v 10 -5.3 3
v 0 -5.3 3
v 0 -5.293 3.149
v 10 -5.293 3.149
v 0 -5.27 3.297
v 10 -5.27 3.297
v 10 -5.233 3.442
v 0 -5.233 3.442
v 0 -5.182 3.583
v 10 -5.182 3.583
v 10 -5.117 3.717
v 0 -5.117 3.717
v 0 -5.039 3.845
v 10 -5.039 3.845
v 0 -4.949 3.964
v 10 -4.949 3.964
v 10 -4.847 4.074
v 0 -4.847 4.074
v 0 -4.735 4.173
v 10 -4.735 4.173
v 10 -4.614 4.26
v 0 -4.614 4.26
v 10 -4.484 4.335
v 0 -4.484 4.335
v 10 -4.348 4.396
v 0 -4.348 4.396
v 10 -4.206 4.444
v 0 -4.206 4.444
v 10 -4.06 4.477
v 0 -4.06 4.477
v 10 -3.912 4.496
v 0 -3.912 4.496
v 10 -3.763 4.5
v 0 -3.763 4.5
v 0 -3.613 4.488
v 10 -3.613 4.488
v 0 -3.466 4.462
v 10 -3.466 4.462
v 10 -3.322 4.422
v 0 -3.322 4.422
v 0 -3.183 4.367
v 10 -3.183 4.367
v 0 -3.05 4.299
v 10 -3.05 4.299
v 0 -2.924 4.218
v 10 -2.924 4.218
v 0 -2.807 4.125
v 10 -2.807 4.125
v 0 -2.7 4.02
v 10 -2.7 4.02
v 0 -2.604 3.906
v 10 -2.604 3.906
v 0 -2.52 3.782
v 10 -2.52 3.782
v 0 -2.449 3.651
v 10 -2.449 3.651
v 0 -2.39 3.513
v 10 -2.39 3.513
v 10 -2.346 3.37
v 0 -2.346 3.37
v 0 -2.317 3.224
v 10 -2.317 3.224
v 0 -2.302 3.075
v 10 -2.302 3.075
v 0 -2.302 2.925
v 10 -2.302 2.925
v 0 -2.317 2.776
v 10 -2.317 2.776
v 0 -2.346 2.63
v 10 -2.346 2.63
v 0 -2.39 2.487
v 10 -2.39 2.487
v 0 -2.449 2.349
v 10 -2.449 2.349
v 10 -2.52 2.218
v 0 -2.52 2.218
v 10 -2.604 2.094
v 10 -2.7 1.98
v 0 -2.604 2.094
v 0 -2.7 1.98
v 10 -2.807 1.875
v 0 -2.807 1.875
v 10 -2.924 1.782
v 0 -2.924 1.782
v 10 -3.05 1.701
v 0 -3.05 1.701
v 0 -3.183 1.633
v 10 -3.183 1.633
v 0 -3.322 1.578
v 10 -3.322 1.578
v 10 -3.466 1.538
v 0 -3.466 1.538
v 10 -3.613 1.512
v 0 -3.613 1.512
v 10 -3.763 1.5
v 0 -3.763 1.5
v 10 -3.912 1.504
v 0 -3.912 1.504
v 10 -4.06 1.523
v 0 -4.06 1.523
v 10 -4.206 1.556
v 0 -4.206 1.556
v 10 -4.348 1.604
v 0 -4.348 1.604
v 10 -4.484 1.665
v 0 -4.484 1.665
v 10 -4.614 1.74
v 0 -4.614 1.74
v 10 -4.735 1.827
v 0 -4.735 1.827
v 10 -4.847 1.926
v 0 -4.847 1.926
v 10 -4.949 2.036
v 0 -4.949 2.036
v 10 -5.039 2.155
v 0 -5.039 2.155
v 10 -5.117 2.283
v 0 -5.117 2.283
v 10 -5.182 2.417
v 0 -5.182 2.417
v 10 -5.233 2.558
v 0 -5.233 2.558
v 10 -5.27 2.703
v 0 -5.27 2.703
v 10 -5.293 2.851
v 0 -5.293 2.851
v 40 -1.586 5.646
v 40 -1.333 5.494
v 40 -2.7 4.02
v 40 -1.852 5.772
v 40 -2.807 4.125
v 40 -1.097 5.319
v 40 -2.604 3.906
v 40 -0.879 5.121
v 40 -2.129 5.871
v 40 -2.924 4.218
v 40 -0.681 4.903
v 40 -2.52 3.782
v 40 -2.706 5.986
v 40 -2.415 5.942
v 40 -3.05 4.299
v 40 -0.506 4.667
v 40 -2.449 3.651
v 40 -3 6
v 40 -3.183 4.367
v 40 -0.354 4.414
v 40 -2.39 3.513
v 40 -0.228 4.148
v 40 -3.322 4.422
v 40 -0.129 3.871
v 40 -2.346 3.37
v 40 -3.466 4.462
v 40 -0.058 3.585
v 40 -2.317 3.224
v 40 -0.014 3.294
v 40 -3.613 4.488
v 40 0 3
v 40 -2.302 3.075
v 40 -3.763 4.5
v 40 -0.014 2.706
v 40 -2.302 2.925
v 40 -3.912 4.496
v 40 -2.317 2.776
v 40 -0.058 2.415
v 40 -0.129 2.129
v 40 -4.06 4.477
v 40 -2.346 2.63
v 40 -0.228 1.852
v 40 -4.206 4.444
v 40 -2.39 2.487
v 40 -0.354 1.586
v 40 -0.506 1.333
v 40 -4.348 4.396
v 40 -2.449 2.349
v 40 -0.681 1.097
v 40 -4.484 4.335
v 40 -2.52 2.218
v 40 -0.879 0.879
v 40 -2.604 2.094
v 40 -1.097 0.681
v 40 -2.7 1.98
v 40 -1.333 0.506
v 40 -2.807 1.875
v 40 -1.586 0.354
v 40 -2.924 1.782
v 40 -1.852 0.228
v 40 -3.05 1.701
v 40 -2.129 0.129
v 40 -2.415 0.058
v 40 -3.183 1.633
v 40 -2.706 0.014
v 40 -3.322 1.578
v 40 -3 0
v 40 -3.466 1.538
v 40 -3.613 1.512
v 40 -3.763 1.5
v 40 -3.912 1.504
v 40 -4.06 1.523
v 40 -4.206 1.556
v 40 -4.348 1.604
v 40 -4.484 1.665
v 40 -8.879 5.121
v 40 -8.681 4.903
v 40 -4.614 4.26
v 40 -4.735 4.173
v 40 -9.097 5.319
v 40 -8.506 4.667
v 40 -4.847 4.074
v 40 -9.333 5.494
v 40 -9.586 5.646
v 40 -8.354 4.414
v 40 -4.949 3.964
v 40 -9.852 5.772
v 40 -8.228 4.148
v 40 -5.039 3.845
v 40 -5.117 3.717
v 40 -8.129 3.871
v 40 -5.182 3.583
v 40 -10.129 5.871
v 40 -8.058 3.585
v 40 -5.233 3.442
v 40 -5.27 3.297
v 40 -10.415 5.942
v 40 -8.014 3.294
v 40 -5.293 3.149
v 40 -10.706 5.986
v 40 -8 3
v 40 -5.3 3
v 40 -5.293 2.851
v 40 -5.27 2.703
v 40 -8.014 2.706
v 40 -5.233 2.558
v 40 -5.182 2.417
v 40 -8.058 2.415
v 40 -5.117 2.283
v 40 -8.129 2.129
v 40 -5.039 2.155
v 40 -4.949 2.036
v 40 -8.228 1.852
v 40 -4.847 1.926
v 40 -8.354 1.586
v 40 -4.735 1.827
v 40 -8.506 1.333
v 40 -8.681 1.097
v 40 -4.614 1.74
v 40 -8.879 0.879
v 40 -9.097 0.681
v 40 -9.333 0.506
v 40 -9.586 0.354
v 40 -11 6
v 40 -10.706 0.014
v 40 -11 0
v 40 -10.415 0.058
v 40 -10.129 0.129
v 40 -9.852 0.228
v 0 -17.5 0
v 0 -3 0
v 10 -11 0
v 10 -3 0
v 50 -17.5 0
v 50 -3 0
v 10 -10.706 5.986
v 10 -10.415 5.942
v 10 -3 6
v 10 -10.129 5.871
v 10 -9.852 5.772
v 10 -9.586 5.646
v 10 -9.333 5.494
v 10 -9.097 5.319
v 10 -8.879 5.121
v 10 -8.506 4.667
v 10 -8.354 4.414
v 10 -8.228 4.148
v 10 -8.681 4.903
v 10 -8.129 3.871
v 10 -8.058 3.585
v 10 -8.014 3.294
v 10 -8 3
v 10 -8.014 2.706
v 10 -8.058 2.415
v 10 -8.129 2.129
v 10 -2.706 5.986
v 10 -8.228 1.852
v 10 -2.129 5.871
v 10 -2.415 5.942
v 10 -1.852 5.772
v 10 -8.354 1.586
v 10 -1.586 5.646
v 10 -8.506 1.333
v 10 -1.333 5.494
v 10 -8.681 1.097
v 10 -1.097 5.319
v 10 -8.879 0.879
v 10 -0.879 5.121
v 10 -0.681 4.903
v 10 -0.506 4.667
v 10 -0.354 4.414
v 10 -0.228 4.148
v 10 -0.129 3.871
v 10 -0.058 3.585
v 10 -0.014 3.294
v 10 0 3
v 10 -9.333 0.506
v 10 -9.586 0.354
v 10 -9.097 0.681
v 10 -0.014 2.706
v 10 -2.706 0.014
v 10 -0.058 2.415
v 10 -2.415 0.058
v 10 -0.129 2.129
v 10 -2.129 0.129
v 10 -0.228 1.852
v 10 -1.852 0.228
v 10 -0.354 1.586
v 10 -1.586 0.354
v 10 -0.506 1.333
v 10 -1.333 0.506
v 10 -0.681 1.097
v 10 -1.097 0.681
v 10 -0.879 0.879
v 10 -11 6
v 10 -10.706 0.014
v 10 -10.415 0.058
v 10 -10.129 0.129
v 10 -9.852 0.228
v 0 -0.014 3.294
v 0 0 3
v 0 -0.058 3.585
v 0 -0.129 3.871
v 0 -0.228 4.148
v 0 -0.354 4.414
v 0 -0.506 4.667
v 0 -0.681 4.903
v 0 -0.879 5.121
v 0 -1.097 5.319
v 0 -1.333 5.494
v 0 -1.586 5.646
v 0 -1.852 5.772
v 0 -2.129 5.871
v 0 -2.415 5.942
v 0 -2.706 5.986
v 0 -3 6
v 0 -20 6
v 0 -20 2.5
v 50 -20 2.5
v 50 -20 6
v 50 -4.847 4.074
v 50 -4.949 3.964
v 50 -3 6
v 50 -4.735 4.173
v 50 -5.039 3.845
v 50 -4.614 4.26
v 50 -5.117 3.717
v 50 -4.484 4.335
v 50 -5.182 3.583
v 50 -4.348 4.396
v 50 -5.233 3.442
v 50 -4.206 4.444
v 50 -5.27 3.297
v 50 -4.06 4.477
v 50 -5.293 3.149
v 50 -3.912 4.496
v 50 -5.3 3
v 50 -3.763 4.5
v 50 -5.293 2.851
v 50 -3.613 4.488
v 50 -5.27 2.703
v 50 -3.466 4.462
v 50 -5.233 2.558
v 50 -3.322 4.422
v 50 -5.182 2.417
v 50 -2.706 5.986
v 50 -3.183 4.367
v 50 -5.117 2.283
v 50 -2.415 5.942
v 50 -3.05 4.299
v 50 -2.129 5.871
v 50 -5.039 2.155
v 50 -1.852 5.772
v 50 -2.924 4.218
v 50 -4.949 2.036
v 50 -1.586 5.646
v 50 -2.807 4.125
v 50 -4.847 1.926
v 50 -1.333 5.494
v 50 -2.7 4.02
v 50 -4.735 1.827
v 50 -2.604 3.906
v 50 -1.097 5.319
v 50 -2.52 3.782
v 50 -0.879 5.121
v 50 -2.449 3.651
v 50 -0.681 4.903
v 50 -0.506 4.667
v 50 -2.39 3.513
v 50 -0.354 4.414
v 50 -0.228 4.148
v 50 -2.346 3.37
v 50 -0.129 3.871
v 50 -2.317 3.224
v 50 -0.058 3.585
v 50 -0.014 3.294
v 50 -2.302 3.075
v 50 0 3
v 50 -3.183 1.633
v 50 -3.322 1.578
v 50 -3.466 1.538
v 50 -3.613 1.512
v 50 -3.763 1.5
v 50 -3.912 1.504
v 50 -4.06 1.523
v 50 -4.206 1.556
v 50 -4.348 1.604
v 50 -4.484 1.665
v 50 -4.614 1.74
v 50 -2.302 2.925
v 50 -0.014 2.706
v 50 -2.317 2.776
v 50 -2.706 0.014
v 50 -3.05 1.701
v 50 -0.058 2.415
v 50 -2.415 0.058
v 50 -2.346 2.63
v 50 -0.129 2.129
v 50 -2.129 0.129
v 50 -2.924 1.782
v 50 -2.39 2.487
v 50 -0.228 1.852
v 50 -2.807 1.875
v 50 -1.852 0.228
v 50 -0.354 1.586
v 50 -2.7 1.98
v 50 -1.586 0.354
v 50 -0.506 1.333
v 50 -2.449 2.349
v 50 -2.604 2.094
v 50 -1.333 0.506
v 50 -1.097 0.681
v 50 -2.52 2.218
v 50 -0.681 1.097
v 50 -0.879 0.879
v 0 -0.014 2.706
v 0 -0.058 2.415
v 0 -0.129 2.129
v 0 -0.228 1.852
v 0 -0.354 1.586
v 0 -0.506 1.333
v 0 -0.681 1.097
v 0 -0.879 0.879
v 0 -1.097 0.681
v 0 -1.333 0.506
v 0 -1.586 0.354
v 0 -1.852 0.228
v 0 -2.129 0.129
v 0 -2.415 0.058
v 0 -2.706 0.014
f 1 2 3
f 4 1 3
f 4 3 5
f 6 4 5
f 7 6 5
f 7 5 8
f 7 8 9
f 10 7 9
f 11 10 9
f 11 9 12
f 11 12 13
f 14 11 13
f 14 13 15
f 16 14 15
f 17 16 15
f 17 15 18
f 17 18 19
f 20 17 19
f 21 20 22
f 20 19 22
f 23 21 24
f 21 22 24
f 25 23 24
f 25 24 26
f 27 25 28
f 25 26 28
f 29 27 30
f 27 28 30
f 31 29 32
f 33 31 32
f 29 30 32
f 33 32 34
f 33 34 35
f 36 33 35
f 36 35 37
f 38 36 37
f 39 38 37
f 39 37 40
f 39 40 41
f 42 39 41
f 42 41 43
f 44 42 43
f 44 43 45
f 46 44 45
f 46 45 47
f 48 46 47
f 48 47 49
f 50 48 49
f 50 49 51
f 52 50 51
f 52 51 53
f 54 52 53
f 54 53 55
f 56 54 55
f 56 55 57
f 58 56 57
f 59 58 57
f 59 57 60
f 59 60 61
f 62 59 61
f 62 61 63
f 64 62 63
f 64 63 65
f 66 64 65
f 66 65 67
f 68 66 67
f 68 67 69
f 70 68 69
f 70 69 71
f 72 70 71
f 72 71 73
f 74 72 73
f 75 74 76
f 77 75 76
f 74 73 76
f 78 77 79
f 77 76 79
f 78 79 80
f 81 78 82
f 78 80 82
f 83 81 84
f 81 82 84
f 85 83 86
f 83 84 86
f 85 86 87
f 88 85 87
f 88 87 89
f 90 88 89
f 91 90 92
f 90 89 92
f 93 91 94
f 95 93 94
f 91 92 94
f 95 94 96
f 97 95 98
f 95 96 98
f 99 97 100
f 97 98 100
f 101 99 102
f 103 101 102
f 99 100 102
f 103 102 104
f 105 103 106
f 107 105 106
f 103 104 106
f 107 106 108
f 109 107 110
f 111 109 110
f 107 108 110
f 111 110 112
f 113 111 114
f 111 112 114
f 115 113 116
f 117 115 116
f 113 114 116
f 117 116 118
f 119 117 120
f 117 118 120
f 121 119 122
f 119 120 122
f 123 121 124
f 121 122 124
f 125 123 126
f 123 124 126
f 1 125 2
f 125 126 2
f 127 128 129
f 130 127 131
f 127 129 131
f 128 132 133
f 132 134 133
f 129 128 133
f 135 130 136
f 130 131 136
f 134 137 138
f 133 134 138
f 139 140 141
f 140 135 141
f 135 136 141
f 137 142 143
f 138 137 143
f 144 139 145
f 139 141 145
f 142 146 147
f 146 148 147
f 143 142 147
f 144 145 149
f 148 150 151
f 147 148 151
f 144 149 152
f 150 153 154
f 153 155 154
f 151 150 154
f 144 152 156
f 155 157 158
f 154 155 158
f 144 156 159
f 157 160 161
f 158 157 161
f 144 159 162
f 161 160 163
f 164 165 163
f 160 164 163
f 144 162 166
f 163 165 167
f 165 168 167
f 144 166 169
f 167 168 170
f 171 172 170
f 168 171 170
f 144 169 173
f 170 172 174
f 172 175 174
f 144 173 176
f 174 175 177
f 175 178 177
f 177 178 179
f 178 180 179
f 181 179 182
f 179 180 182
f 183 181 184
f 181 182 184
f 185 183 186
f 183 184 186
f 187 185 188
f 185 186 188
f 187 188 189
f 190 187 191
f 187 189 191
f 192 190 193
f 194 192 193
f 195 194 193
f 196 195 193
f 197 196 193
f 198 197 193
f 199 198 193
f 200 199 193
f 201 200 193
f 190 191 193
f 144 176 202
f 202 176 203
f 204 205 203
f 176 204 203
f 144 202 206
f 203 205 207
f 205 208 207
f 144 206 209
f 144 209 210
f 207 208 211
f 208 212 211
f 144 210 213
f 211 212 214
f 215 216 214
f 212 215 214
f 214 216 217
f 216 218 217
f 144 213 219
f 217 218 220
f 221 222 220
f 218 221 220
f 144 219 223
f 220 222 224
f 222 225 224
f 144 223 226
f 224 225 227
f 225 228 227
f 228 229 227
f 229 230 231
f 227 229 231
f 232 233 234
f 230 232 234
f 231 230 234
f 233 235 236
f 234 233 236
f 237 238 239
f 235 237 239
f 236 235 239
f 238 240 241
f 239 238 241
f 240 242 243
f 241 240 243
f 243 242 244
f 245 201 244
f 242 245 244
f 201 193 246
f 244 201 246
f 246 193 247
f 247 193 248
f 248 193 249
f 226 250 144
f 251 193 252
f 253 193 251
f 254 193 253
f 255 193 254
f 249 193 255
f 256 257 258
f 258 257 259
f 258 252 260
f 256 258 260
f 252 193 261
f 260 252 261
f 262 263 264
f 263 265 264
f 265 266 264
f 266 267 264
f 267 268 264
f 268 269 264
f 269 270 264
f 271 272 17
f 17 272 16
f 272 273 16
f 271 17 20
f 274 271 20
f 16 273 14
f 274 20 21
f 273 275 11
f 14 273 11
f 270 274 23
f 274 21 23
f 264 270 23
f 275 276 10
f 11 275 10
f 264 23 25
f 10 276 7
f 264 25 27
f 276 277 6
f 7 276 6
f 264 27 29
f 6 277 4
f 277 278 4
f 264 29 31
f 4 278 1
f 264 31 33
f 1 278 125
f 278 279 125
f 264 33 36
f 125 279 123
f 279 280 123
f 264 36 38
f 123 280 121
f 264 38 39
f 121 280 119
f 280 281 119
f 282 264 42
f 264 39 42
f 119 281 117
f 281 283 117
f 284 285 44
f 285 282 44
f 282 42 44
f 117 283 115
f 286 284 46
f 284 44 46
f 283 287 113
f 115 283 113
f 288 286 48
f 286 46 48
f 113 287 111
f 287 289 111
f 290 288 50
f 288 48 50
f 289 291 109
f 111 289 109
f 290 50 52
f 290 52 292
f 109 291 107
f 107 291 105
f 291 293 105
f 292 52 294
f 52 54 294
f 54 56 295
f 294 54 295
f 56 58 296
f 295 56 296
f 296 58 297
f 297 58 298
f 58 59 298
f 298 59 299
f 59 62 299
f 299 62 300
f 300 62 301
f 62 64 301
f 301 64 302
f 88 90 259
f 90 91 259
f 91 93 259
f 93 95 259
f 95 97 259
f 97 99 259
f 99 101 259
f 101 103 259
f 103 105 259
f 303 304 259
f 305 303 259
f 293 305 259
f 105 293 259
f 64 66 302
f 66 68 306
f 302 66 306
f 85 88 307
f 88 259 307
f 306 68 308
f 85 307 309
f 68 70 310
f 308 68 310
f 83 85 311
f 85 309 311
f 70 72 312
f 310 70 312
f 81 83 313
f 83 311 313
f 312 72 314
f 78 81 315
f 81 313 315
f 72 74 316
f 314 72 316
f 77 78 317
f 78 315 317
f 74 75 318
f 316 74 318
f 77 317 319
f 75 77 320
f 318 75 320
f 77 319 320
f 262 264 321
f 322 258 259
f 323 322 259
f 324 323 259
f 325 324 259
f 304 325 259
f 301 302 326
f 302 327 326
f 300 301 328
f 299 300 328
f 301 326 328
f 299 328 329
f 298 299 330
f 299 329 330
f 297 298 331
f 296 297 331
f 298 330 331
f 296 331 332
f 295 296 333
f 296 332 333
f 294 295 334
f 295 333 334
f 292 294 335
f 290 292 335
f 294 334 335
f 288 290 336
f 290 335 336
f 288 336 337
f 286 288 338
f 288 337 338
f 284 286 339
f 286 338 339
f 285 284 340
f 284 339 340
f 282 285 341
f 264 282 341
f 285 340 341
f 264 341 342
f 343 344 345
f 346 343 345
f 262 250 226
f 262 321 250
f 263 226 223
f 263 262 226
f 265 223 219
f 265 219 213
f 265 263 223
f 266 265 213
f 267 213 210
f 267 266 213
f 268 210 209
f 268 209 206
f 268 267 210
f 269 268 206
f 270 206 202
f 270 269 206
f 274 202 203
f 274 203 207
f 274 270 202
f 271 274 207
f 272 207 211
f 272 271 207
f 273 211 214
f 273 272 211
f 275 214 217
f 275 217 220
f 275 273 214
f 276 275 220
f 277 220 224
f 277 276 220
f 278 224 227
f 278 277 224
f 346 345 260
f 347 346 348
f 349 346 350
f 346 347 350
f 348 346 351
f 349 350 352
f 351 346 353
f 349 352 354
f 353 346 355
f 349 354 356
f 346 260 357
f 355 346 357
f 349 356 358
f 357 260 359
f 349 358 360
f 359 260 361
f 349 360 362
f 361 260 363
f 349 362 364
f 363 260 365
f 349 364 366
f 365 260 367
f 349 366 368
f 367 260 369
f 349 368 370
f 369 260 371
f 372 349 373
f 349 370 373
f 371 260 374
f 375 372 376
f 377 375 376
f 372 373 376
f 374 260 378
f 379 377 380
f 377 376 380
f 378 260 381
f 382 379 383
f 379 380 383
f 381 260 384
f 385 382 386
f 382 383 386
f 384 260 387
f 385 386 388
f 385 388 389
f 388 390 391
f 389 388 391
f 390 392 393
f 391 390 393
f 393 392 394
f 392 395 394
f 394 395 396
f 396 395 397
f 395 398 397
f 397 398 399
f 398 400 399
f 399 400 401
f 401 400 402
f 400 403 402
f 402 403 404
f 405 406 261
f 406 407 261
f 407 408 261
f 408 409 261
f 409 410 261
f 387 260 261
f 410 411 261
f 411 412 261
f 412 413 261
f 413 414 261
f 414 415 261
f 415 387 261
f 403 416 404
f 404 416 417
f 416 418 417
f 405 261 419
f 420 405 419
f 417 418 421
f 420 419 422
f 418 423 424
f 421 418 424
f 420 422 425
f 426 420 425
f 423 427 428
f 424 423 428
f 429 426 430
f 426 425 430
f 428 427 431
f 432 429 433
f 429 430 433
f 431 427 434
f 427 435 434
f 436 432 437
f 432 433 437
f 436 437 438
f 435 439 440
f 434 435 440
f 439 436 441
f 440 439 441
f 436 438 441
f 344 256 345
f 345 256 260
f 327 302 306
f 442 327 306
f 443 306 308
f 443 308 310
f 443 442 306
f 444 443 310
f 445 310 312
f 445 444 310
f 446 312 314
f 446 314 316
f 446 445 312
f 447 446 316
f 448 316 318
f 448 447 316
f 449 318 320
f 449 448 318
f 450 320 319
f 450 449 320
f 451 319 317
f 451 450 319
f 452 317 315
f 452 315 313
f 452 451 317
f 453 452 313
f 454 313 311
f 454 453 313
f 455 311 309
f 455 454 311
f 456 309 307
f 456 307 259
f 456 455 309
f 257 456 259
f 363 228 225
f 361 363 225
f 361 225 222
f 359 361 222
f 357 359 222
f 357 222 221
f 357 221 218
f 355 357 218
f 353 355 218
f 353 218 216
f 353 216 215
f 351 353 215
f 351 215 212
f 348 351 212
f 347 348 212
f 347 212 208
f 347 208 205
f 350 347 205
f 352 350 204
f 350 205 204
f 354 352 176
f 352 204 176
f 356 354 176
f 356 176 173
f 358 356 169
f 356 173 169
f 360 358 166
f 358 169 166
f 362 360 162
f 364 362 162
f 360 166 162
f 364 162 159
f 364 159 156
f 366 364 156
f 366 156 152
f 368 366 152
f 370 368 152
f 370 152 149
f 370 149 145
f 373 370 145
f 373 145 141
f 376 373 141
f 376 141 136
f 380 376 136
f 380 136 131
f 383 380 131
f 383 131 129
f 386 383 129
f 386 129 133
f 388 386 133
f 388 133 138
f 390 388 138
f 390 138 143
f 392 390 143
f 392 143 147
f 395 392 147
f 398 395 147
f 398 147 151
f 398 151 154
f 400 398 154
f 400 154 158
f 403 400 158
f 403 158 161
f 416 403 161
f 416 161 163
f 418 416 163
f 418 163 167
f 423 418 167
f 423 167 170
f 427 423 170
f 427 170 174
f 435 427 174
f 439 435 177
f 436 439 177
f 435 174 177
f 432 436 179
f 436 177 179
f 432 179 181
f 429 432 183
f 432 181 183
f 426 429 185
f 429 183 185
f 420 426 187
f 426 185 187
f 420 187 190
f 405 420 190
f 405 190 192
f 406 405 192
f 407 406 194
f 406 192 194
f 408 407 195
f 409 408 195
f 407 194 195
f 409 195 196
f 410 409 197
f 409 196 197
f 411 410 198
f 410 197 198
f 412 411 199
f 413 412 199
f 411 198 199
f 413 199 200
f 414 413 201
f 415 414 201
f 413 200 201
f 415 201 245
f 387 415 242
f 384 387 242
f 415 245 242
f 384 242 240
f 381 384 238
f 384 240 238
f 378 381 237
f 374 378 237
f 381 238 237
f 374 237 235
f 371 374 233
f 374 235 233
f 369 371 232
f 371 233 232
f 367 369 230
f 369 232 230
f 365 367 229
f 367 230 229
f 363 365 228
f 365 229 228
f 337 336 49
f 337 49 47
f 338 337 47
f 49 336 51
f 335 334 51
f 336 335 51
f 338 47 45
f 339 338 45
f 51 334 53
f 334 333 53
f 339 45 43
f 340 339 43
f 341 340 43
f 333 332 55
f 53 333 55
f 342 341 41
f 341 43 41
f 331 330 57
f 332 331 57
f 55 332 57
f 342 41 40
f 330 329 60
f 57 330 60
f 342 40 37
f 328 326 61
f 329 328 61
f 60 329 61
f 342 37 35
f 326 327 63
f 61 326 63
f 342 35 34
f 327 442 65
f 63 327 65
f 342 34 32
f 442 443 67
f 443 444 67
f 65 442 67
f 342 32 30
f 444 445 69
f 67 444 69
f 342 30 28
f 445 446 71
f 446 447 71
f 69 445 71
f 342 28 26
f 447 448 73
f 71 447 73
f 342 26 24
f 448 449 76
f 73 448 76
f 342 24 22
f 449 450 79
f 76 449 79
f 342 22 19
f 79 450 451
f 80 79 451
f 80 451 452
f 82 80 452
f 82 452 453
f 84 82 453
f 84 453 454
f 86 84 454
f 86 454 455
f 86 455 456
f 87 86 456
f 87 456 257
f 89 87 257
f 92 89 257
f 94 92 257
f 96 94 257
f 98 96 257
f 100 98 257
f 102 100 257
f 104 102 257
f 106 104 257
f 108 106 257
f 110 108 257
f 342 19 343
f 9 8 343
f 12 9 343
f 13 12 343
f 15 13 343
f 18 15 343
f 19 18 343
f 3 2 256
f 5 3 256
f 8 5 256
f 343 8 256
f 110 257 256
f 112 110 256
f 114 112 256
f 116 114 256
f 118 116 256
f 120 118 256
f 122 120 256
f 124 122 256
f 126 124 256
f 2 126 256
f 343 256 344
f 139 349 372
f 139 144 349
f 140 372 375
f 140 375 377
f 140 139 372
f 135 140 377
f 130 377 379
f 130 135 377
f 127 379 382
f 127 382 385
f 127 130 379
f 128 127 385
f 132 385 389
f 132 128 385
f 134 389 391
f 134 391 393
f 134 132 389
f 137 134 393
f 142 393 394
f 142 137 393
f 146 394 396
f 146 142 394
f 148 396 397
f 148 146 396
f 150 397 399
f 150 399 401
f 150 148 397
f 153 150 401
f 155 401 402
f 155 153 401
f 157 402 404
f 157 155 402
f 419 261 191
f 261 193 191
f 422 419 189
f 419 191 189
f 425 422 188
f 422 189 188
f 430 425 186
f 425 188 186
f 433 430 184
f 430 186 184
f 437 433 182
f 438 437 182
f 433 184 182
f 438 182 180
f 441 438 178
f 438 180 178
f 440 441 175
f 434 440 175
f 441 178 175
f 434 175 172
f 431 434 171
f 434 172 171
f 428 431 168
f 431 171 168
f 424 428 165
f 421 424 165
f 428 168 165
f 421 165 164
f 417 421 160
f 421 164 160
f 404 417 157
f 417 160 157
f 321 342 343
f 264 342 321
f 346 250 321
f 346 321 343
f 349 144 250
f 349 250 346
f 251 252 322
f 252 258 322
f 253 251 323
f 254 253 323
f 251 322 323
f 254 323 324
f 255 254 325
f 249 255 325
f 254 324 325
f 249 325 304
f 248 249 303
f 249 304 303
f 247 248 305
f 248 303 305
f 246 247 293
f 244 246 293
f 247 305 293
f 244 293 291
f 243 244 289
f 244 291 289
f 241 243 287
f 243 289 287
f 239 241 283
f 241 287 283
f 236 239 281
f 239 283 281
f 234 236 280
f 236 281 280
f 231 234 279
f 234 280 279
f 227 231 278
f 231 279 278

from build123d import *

# Parameters (mm, degrees)
F1_DEPTH = 6
F2_R     = 1.5
F3_DEPTH = 50.001
F4_R     = 2.99999
F5_SIZE  = 2.5


# Not quite as in the source:
# - a fillet or chamfer is up to 0.001 mm smaller than in the source, because OpenCascade refuses the exact size


with BuildPart() as f1:
    # F0 (on Top) → F1 (new body)
    with BuildSketch(Plane.XY):
        Polygon((0, 0), (0, -20), (50, -20), (50, 0), (40, 0), (40, -8), (10, -8), (10, 0), align=None)
    extrude(amount=F1_DEPTH)

    # F2 (on face) → F3 (cut, through all)
    with BuildSketch(Plane(origin=(0, 0, 0), x_dir=(0, -1, 0), z_dir=(-1, 0, 0))):
        with Locations((3.8, 3)):
            Circle(F2_R)
    extrude(amount=-F3_DEPTH, mode=Mode.SUBTRACT)

    # F4 (radius 3 in the source; OpenCascade refuses exactly that, so slightly less here)
    f4_edges = [f1.edges().sort_by_distance(p)[0] for p in [
        (5, 0, 6),
        (5, 0, 0),
        (45, 0, 6),
        (45, 0, 0),
        (25, -8, 6),
        (25, -8, 0),
    ]]
    fillet(f4_edges, radius=F4_R)

    # F5
    f5_edges = [f1.edges().sort_by_distance(p)[0] for p in [
        (25, -20, 0),
    ]]
    chamfer(f5_edges, length=F5_SIZE)


solid = f1.part
